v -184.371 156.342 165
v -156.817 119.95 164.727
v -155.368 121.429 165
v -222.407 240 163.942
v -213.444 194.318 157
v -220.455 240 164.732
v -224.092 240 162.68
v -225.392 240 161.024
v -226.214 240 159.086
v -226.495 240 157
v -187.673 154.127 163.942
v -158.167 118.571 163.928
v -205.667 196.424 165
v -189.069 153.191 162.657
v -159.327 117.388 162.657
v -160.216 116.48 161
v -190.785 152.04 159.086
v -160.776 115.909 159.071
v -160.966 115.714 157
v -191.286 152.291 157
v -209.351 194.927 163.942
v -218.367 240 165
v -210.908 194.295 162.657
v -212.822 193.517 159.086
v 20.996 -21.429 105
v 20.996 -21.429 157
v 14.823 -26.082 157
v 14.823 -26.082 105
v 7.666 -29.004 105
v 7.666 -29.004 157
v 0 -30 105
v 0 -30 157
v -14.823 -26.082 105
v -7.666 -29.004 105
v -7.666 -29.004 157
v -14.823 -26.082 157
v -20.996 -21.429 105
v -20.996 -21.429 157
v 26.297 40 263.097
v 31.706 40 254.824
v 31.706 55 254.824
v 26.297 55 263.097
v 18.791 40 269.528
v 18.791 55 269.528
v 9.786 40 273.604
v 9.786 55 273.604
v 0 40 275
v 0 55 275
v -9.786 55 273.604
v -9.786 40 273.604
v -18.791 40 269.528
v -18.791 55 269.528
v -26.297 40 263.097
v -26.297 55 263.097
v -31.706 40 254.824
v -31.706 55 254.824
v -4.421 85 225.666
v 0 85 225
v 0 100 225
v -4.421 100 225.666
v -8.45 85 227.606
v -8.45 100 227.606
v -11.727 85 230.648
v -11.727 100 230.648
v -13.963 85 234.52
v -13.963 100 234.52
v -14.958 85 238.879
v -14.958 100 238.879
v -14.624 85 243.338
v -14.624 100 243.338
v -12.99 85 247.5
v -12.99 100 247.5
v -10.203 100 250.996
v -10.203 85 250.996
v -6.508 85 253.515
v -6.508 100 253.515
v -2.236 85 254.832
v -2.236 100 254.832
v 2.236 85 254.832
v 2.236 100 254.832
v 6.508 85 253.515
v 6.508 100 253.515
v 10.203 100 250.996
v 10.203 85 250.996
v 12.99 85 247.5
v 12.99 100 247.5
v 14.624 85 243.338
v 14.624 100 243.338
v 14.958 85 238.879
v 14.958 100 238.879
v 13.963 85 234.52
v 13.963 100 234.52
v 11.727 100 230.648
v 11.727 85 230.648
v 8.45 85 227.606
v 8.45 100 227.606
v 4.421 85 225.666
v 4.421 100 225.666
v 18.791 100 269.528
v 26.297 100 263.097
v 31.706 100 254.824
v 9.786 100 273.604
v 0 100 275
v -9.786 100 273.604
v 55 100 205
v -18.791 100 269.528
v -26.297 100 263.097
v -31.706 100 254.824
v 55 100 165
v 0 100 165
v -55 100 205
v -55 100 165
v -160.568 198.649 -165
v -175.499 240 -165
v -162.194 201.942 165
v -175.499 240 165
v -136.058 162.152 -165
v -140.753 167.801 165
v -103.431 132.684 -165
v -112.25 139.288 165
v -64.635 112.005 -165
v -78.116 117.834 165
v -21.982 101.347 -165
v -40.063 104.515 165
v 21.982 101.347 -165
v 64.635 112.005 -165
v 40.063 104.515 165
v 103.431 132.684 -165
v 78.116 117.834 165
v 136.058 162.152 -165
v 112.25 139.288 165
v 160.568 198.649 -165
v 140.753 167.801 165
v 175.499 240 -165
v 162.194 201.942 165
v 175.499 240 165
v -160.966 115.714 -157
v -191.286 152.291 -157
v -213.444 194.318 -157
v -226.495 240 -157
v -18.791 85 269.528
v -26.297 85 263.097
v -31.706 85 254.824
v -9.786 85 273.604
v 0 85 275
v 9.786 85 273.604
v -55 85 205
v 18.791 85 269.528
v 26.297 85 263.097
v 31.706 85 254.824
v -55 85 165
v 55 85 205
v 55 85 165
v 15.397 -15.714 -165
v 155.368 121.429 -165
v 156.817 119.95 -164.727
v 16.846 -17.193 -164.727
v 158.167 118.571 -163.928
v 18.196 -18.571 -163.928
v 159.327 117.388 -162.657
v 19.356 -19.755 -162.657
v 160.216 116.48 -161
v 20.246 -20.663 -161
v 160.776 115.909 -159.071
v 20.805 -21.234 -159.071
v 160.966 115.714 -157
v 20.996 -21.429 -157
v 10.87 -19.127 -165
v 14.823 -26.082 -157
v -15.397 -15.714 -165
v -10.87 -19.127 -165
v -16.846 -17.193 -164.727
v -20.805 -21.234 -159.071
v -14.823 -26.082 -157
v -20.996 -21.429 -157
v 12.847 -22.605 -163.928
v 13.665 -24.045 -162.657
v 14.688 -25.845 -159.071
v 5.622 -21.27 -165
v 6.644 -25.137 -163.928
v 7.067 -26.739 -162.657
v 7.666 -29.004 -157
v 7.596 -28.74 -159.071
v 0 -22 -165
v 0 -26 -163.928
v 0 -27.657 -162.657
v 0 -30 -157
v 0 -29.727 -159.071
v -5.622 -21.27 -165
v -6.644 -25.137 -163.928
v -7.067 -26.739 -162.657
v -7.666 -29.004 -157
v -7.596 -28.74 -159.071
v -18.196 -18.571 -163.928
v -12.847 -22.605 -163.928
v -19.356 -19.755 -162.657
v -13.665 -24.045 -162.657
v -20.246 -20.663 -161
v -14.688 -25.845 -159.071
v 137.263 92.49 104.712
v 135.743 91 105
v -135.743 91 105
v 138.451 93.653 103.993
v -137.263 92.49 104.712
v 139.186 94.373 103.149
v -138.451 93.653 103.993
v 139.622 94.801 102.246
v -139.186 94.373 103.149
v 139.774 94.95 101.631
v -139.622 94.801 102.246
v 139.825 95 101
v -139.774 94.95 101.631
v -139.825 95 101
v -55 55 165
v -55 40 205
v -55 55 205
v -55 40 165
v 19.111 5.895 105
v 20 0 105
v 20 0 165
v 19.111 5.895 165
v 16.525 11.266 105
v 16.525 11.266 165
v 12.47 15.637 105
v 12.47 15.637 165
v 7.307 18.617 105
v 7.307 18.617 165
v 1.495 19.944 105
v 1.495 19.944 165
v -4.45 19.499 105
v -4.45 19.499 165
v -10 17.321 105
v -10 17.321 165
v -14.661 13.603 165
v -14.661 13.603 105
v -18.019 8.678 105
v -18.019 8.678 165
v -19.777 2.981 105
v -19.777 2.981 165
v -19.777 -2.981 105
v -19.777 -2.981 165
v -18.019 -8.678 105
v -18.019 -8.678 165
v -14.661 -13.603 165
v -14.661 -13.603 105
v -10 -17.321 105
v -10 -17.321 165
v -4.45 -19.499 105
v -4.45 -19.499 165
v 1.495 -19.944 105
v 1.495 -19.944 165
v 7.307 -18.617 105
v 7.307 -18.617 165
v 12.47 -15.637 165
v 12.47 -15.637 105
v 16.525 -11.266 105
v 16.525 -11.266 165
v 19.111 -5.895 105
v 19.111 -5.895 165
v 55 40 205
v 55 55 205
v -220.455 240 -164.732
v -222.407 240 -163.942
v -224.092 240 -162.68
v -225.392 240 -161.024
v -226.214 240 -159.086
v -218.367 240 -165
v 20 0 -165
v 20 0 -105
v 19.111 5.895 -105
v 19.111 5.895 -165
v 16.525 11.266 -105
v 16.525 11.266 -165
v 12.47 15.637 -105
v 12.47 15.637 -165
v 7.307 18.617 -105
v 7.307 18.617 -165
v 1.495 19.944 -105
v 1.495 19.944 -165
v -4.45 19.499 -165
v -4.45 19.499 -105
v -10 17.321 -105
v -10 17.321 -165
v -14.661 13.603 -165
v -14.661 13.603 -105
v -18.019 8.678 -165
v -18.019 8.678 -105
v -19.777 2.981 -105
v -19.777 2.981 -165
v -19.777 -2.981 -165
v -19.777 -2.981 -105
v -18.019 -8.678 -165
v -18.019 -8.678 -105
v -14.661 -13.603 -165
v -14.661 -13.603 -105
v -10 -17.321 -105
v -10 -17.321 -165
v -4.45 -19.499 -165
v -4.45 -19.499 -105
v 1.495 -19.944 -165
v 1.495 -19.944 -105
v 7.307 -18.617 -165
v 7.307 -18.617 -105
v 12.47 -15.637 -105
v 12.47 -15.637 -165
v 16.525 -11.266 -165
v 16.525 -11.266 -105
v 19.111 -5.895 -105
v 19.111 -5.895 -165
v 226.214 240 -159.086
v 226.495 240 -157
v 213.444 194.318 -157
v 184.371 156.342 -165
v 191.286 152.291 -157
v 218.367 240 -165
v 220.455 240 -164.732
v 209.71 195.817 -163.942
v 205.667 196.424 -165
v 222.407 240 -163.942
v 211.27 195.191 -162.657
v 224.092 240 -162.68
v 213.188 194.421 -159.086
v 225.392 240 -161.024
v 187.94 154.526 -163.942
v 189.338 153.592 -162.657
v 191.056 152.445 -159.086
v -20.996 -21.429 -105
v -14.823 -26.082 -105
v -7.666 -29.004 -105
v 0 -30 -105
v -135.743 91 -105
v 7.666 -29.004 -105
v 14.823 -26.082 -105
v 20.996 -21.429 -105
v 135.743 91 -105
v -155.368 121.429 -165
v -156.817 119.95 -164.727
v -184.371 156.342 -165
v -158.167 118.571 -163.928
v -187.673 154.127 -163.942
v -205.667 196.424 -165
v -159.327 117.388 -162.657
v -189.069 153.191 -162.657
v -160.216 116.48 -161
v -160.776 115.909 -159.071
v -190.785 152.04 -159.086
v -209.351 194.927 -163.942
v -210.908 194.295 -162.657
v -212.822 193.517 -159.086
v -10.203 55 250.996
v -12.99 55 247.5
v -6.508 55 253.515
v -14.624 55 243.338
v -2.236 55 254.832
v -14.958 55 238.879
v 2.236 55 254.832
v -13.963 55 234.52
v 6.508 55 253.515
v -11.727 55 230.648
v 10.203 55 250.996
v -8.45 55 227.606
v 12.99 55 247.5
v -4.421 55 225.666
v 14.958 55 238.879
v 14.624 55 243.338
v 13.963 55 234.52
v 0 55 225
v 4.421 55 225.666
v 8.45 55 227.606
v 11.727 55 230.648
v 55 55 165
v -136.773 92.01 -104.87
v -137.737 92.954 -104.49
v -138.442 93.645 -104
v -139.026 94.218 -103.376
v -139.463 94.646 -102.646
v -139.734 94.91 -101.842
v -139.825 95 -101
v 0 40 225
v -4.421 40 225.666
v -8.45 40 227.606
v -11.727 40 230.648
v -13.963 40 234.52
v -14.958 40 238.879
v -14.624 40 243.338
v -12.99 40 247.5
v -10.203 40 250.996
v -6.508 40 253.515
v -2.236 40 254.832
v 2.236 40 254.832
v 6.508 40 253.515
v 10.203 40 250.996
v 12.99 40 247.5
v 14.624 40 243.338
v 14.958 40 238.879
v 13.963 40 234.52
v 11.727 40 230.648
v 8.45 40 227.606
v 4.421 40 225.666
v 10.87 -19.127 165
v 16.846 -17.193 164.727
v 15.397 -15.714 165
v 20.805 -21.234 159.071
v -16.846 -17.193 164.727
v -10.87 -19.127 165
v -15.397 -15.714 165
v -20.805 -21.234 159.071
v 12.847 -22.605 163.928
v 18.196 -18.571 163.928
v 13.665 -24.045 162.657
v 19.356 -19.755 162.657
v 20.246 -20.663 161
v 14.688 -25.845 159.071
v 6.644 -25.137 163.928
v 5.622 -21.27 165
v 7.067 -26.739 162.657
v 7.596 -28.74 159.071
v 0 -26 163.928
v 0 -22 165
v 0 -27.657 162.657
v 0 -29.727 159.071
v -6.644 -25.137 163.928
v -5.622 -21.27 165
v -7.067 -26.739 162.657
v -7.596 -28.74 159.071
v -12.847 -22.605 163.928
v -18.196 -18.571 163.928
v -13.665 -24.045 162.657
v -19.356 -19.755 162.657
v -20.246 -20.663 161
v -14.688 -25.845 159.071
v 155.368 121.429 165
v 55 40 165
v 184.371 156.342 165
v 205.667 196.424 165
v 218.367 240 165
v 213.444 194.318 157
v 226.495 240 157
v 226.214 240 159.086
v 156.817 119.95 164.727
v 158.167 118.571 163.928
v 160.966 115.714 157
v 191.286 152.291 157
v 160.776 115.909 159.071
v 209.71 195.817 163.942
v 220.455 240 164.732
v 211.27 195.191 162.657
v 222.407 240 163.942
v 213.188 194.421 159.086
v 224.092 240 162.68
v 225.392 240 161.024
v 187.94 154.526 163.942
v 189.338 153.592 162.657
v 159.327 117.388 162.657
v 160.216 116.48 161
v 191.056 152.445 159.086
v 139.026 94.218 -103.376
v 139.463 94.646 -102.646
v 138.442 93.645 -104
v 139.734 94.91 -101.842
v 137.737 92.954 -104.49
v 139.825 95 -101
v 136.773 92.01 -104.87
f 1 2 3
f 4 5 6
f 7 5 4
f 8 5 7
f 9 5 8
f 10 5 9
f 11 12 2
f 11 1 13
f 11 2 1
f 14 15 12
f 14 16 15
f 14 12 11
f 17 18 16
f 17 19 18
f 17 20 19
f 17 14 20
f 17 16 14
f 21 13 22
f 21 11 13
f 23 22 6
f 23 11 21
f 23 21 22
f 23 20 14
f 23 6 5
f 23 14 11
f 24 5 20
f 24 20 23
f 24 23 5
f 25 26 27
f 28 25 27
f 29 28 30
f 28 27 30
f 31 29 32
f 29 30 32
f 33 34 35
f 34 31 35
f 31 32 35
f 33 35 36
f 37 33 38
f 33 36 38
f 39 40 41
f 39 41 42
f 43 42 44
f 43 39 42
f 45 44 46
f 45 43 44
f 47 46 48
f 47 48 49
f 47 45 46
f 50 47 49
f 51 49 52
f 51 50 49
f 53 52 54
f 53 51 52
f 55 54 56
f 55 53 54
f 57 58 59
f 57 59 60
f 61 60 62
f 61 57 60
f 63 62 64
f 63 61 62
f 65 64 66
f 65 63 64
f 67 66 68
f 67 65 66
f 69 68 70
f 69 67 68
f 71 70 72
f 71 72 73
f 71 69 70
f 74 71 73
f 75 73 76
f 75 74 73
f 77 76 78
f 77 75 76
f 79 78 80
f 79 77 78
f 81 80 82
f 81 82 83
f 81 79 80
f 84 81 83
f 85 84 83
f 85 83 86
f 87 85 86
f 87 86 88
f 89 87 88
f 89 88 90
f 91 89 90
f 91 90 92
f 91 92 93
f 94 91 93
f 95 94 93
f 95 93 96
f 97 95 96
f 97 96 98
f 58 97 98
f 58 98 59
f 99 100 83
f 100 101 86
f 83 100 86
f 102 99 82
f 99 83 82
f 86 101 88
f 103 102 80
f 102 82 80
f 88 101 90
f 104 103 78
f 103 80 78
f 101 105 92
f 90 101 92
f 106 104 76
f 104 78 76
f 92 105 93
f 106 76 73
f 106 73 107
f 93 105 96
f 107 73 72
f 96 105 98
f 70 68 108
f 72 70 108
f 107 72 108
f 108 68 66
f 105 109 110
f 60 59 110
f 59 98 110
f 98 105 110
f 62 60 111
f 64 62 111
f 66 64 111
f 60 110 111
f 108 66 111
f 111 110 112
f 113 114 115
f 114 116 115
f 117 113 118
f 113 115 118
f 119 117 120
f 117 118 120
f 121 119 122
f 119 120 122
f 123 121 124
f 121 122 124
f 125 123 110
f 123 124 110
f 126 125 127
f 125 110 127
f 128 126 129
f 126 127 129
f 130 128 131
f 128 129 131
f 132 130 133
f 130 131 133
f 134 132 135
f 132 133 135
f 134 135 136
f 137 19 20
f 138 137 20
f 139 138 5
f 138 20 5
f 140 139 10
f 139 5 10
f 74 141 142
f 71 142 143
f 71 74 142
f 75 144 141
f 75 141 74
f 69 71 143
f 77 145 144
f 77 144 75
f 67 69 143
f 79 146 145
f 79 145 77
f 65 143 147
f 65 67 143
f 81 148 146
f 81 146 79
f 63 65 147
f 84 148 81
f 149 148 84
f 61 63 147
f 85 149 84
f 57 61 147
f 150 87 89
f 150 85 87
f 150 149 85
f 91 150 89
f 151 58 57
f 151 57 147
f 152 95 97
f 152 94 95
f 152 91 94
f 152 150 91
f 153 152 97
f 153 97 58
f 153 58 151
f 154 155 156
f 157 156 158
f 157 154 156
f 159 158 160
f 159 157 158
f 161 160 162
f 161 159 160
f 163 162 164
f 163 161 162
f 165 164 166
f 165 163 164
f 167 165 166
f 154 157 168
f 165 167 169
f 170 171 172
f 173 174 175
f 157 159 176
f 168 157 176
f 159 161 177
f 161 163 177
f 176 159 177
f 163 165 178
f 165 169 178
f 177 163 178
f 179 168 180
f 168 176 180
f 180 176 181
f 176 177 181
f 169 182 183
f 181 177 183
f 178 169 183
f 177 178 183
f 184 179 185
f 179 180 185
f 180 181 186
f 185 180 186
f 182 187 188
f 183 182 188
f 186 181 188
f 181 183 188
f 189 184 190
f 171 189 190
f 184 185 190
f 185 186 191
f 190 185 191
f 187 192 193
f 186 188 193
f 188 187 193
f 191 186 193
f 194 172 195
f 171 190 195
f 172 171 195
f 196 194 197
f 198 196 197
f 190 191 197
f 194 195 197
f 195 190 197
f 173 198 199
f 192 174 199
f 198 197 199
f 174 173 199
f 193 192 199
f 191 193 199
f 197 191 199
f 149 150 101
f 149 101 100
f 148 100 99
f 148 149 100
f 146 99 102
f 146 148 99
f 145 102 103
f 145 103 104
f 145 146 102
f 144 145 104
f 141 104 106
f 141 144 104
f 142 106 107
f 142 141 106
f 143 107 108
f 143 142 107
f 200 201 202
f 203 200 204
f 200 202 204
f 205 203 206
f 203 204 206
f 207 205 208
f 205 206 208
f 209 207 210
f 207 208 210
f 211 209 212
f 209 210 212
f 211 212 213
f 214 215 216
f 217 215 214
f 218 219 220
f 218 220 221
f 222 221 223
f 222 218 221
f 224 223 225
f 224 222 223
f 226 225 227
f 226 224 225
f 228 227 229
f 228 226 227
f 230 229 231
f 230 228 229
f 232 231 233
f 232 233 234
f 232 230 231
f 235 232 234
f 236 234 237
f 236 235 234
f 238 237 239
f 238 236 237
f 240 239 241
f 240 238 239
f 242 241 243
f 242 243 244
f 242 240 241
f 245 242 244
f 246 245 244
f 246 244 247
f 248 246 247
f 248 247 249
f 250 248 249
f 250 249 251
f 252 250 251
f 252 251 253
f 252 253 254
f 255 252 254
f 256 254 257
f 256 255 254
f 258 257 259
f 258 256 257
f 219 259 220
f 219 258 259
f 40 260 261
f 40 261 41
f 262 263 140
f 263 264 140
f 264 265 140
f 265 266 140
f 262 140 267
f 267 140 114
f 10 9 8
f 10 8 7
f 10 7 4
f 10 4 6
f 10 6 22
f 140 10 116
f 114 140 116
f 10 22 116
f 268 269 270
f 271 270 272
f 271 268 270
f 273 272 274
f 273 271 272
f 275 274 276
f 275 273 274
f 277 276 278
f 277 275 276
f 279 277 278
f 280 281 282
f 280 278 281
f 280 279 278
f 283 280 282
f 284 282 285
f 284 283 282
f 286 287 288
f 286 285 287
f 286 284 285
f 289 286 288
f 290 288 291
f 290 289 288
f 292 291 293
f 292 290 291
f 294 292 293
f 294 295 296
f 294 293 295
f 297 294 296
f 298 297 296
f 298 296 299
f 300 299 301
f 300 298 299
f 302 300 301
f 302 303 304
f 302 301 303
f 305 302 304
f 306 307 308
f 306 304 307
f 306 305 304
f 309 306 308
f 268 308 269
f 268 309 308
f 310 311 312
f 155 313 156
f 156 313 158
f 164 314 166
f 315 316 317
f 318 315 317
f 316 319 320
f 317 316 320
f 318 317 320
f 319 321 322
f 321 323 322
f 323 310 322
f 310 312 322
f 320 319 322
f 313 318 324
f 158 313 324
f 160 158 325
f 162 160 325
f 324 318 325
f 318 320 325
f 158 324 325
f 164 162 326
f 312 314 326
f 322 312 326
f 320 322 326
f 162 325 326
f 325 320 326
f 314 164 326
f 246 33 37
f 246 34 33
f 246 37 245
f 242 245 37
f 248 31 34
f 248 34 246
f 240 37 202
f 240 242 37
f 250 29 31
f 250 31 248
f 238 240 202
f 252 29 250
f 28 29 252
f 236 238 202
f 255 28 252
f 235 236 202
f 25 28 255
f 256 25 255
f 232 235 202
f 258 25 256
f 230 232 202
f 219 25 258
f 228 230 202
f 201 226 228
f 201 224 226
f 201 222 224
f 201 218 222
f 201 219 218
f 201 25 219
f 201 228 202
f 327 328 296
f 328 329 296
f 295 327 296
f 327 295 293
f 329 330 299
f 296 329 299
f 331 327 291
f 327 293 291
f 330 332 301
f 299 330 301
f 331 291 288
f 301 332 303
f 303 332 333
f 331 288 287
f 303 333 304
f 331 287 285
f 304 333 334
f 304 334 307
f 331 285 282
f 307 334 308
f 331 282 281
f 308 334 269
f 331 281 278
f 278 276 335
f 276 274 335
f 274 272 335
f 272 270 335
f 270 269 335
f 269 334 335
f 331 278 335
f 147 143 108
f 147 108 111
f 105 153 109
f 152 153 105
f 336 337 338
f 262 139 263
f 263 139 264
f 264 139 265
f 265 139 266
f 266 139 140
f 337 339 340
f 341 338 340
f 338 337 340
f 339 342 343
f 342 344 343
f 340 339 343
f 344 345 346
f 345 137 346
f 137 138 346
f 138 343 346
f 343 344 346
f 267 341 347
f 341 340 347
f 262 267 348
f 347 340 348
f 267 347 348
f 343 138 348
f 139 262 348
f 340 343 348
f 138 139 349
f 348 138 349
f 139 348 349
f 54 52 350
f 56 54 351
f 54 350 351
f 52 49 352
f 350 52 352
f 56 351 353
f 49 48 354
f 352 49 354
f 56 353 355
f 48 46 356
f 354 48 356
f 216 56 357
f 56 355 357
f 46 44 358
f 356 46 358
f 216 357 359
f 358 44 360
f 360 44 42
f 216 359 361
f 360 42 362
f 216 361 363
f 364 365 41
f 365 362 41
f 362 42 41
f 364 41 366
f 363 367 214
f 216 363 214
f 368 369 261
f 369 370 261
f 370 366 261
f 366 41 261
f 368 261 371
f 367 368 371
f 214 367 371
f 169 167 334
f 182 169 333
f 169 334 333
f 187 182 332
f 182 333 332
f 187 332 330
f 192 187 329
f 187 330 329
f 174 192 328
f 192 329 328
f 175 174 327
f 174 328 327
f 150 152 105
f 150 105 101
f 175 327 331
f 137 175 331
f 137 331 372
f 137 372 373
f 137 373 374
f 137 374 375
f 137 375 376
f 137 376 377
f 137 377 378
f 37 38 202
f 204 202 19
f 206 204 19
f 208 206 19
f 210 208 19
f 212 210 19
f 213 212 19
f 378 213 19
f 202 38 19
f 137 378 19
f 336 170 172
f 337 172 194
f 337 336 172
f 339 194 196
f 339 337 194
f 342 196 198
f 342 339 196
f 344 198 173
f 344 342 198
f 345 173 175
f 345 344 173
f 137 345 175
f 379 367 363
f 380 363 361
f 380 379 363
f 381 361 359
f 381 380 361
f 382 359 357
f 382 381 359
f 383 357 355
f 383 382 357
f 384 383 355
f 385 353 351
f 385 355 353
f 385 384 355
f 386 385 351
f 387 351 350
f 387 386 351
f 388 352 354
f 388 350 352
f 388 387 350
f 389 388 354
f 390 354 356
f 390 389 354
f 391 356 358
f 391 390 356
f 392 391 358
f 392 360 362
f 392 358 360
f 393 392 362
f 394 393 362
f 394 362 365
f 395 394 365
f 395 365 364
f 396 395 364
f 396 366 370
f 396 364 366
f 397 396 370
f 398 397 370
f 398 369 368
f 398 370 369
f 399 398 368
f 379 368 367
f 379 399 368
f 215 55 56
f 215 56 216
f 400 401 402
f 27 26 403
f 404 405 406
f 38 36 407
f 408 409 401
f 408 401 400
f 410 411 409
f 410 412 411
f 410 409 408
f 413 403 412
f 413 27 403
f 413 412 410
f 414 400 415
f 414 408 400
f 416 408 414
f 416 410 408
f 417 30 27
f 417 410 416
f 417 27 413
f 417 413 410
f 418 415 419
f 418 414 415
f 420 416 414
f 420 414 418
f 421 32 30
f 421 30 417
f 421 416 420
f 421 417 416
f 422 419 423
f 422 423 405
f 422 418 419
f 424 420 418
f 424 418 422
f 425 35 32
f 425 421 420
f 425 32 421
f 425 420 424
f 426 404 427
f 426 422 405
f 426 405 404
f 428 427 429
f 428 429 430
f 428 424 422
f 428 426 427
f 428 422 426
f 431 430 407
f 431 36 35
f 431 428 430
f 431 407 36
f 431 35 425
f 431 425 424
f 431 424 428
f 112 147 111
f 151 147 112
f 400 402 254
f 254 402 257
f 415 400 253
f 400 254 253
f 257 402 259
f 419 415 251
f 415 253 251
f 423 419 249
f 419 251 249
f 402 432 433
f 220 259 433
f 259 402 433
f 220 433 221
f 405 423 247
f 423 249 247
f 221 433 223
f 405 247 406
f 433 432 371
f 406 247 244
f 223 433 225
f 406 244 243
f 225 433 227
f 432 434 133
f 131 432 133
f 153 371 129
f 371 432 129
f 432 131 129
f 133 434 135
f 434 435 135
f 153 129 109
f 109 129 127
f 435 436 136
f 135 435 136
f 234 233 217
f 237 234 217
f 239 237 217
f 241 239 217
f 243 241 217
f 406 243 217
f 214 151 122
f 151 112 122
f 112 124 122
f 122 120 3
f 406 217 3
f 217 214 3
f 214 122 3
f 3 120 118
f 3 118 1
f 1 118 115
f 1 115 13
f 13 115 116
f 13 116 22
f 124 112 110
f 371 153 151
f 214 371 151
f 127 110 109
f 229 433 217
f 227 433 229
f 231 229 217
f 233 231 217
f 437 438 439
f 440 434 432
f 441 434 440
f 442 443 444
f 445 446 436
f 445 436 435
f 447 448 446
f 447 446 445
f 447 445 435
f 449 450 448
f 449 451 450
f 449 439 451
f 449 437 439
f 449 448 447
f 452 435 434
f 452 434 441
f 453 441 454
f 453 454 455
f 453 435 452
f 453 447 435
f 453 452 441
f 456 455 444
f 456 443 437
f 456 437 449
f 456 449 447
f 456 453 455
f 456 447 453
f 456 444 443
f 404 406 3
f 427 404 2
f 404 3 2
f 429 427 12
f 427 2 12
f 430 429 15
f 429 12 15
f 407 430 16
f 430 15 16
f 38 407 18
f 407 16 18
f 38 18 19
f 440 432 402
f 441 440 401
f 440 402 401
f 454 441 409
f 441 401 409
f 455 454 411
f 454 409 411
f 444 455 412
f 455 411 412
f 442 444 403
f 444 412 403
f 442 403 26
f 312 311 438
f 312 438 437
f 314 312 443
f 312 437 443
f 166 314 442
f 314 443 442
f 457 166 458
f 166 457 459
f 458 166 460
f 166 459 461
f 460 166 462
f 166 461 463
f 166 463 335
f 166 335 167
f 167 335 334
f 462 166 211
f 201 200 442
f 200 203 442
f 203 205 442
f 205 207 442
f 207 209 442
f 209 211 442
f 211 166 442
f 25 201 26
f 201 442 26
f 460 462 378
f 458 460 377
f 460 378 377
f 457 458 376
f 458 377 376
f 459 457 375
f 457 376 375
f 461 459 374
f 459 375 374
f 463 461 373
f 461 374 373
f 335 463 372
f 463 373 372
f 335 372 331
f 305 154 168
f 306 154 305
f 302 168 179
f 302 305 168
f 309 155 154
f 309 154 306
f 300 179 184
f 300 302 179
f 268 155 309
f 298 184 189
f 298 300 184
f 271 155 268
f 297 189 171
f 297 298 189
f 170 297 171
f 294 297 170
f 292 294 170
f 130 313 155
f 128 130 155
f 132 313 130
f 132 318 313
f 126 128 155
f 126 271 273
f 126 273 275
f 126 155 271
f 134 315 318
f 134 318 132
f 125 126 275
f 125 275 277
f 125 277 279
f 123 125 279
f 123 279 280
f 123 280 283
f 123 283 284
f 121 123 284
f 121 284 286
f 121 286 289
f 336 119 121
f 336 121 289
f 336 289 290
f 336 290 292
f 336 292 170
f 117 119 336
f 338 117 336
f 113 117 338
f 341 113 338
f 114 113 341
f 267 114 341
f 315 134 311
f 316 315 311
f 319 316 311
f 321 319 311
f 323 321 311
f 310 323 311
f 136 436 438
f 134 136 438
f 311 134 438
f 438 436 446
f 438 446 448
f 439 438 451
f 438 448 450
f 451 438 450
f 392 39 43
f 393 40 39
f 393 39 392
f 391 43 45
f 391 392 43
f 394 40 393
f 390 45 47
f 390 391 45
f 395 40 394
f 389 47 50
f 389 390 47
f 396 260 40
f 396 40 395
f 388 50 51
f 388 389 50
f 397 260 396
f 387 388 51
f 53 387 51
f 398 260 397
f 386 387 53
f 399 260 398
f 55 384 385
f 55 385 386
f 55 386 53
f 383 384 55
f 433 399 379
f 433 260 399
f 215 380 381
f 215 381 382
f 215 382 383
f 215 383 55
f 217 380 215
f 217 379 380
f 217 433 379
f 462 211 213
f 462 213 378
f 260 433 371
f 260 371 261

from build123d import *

# Parameters (mm, degrees)
SKETCH1_R           = 20
BOSS_EXTRUDE1_DEPTH = 165
BOSS_EXTRUDE2_START = 40
SKETCH2_R           = 15
BOSS_EXTRUDE2_DEPTH = 60
SKETCH3_W           = 206.239754747
SKETCH3_H           = 30
CUT_EXTRUDE1_DEPTH  = 173.5
SKETCH4_W           = 210
SKETCH4_H           = 170.517407572
CUT_EXTRUDE2_DEPTH  = 1054.5
FILLET1_R           = 4
FILLET2_R           = 8


with BuildPart() as part:
    # Sketch1 → Boss-Extrude1 (new, symmetric)
    with BuildSketch(Plane.XY):
        with BuildLine():
            Line((-226.495033058, 240), (-175.499287748, 240))
            ThreePointArc((-175.499287748, 240), (0, 100), (175.499287748, 240))
            Line((175.499287748, 240), (226.495033058, 240))
            ThreePointArc((226.495033058, 240), (203.453529219, 172.730892386), (160.966468811, 115.714285714))
            Line((160.966468811, 115.714285714), (20.995626367, -21.428571429))
            ThreePointArc((20.995626367, -21.428571429), (0, -30), (-20.995626367, -21.428571429))
            Line((-20.995626367, -21.428571429), (-160.966468811, 115.714285714))
            ThreePointArc((-160.966468811, 115.714285714), (-203.453529219, 172.730892386), (-226.495033058, 240))
        make_face()
        Circle(SKETCH1_R, mode=Mode.SUBTRACT)
    extrude(amount=BOSS_EXTRUDE1_DEPTH, both=True)

    # Sketch2 → Boss-Extrude2 (add)
    with BuildSketch(Plane(origin=(0, 0, 0), x_dir=(1, 0, 0), z_dir=(0, 1, 0)).offset(BOSS_EXTRUDE2_START)):
        with BuildLine():
            Line((-55, -165), (55, -165))
            Line((55, -165), (55, -205))
            Line((55, -205), (31.705882353, -254.823529412))
            ThreePointArc((31.705882353, -254.823529412), (0, -275), (-31.705882353, -254.823529412))
            Line((-31.705882353, -254.823529412), (-55, -205))
            Line((-55, -205), (-55, -165))
        make_face()
        with Locations(Location((0, -240, 0), (0, 0, 90))):
            Circle(SKETCH2_R, mode=Mode.SUBTRACT)
    extrude(amount=BOSS_EXTRUDE2_DEPTH)

    # Sketch3 → Cut-Extrude1 (cut, symmetric)
    with BuildSketch(Plane(origin=(0, 0, 0), x_dir=(0, 0, -1), z_dir=(1, 0, 0))):
        with Locations((-268.119877374, 70)):
            Rectangle(SKETCH3_W, SKETCH3_H)
    extrude(amount=CUT_EXTRUDE1_DEPTH, both=True, mode=Mode.SUBTRACT)

    # Sketch4 → Cut-Extrude2 (cut, symmetric)
    with BuildSketch(Plane(origin=(0, 0, 0), x_dir=(0, 0, -1), z_dir=(1, 0, 0))):
        with Locations((0, 9.741296214)):
            Rectangle(SKETCH4_W, SKETCH4_H)
    extrude(amount=CUT_EXTRUDE2_DEPTH, both=True, mode=Mode.SUBTRACT)

    # Fillet1
    fillet1_edges = [part.edges().sort_by_distance(p)[0] for p in [
        (0, 95, 105),
        (0, 95, -105),
    ]]
    fillet(fillet1_edges, radius=FILLET1_R)

    # Fillet2
    fillet2_edges = [part.edges().sort_by_distance(p)[0] for p in [
        (-90.981047589, 47.142857143, -165),
        (-203.453529219, 172.730892386, -165),
        (-203.453529219, 172.730892386, 165),
        (-90.981047589, 47.142857143, 165),
        (0, -30, 165),
        (90.981047589, 47.142857143, 165),
        (203.453529219, 172.730892386, 165),
        (203.453529219, 172.730892386, -165),
        (90.981047589, 47.142857143, -165),
        (0, -30, -165),
    ]]
    fillet(fillet2_edges, radius=FILLET2_R)


solid = part.part
